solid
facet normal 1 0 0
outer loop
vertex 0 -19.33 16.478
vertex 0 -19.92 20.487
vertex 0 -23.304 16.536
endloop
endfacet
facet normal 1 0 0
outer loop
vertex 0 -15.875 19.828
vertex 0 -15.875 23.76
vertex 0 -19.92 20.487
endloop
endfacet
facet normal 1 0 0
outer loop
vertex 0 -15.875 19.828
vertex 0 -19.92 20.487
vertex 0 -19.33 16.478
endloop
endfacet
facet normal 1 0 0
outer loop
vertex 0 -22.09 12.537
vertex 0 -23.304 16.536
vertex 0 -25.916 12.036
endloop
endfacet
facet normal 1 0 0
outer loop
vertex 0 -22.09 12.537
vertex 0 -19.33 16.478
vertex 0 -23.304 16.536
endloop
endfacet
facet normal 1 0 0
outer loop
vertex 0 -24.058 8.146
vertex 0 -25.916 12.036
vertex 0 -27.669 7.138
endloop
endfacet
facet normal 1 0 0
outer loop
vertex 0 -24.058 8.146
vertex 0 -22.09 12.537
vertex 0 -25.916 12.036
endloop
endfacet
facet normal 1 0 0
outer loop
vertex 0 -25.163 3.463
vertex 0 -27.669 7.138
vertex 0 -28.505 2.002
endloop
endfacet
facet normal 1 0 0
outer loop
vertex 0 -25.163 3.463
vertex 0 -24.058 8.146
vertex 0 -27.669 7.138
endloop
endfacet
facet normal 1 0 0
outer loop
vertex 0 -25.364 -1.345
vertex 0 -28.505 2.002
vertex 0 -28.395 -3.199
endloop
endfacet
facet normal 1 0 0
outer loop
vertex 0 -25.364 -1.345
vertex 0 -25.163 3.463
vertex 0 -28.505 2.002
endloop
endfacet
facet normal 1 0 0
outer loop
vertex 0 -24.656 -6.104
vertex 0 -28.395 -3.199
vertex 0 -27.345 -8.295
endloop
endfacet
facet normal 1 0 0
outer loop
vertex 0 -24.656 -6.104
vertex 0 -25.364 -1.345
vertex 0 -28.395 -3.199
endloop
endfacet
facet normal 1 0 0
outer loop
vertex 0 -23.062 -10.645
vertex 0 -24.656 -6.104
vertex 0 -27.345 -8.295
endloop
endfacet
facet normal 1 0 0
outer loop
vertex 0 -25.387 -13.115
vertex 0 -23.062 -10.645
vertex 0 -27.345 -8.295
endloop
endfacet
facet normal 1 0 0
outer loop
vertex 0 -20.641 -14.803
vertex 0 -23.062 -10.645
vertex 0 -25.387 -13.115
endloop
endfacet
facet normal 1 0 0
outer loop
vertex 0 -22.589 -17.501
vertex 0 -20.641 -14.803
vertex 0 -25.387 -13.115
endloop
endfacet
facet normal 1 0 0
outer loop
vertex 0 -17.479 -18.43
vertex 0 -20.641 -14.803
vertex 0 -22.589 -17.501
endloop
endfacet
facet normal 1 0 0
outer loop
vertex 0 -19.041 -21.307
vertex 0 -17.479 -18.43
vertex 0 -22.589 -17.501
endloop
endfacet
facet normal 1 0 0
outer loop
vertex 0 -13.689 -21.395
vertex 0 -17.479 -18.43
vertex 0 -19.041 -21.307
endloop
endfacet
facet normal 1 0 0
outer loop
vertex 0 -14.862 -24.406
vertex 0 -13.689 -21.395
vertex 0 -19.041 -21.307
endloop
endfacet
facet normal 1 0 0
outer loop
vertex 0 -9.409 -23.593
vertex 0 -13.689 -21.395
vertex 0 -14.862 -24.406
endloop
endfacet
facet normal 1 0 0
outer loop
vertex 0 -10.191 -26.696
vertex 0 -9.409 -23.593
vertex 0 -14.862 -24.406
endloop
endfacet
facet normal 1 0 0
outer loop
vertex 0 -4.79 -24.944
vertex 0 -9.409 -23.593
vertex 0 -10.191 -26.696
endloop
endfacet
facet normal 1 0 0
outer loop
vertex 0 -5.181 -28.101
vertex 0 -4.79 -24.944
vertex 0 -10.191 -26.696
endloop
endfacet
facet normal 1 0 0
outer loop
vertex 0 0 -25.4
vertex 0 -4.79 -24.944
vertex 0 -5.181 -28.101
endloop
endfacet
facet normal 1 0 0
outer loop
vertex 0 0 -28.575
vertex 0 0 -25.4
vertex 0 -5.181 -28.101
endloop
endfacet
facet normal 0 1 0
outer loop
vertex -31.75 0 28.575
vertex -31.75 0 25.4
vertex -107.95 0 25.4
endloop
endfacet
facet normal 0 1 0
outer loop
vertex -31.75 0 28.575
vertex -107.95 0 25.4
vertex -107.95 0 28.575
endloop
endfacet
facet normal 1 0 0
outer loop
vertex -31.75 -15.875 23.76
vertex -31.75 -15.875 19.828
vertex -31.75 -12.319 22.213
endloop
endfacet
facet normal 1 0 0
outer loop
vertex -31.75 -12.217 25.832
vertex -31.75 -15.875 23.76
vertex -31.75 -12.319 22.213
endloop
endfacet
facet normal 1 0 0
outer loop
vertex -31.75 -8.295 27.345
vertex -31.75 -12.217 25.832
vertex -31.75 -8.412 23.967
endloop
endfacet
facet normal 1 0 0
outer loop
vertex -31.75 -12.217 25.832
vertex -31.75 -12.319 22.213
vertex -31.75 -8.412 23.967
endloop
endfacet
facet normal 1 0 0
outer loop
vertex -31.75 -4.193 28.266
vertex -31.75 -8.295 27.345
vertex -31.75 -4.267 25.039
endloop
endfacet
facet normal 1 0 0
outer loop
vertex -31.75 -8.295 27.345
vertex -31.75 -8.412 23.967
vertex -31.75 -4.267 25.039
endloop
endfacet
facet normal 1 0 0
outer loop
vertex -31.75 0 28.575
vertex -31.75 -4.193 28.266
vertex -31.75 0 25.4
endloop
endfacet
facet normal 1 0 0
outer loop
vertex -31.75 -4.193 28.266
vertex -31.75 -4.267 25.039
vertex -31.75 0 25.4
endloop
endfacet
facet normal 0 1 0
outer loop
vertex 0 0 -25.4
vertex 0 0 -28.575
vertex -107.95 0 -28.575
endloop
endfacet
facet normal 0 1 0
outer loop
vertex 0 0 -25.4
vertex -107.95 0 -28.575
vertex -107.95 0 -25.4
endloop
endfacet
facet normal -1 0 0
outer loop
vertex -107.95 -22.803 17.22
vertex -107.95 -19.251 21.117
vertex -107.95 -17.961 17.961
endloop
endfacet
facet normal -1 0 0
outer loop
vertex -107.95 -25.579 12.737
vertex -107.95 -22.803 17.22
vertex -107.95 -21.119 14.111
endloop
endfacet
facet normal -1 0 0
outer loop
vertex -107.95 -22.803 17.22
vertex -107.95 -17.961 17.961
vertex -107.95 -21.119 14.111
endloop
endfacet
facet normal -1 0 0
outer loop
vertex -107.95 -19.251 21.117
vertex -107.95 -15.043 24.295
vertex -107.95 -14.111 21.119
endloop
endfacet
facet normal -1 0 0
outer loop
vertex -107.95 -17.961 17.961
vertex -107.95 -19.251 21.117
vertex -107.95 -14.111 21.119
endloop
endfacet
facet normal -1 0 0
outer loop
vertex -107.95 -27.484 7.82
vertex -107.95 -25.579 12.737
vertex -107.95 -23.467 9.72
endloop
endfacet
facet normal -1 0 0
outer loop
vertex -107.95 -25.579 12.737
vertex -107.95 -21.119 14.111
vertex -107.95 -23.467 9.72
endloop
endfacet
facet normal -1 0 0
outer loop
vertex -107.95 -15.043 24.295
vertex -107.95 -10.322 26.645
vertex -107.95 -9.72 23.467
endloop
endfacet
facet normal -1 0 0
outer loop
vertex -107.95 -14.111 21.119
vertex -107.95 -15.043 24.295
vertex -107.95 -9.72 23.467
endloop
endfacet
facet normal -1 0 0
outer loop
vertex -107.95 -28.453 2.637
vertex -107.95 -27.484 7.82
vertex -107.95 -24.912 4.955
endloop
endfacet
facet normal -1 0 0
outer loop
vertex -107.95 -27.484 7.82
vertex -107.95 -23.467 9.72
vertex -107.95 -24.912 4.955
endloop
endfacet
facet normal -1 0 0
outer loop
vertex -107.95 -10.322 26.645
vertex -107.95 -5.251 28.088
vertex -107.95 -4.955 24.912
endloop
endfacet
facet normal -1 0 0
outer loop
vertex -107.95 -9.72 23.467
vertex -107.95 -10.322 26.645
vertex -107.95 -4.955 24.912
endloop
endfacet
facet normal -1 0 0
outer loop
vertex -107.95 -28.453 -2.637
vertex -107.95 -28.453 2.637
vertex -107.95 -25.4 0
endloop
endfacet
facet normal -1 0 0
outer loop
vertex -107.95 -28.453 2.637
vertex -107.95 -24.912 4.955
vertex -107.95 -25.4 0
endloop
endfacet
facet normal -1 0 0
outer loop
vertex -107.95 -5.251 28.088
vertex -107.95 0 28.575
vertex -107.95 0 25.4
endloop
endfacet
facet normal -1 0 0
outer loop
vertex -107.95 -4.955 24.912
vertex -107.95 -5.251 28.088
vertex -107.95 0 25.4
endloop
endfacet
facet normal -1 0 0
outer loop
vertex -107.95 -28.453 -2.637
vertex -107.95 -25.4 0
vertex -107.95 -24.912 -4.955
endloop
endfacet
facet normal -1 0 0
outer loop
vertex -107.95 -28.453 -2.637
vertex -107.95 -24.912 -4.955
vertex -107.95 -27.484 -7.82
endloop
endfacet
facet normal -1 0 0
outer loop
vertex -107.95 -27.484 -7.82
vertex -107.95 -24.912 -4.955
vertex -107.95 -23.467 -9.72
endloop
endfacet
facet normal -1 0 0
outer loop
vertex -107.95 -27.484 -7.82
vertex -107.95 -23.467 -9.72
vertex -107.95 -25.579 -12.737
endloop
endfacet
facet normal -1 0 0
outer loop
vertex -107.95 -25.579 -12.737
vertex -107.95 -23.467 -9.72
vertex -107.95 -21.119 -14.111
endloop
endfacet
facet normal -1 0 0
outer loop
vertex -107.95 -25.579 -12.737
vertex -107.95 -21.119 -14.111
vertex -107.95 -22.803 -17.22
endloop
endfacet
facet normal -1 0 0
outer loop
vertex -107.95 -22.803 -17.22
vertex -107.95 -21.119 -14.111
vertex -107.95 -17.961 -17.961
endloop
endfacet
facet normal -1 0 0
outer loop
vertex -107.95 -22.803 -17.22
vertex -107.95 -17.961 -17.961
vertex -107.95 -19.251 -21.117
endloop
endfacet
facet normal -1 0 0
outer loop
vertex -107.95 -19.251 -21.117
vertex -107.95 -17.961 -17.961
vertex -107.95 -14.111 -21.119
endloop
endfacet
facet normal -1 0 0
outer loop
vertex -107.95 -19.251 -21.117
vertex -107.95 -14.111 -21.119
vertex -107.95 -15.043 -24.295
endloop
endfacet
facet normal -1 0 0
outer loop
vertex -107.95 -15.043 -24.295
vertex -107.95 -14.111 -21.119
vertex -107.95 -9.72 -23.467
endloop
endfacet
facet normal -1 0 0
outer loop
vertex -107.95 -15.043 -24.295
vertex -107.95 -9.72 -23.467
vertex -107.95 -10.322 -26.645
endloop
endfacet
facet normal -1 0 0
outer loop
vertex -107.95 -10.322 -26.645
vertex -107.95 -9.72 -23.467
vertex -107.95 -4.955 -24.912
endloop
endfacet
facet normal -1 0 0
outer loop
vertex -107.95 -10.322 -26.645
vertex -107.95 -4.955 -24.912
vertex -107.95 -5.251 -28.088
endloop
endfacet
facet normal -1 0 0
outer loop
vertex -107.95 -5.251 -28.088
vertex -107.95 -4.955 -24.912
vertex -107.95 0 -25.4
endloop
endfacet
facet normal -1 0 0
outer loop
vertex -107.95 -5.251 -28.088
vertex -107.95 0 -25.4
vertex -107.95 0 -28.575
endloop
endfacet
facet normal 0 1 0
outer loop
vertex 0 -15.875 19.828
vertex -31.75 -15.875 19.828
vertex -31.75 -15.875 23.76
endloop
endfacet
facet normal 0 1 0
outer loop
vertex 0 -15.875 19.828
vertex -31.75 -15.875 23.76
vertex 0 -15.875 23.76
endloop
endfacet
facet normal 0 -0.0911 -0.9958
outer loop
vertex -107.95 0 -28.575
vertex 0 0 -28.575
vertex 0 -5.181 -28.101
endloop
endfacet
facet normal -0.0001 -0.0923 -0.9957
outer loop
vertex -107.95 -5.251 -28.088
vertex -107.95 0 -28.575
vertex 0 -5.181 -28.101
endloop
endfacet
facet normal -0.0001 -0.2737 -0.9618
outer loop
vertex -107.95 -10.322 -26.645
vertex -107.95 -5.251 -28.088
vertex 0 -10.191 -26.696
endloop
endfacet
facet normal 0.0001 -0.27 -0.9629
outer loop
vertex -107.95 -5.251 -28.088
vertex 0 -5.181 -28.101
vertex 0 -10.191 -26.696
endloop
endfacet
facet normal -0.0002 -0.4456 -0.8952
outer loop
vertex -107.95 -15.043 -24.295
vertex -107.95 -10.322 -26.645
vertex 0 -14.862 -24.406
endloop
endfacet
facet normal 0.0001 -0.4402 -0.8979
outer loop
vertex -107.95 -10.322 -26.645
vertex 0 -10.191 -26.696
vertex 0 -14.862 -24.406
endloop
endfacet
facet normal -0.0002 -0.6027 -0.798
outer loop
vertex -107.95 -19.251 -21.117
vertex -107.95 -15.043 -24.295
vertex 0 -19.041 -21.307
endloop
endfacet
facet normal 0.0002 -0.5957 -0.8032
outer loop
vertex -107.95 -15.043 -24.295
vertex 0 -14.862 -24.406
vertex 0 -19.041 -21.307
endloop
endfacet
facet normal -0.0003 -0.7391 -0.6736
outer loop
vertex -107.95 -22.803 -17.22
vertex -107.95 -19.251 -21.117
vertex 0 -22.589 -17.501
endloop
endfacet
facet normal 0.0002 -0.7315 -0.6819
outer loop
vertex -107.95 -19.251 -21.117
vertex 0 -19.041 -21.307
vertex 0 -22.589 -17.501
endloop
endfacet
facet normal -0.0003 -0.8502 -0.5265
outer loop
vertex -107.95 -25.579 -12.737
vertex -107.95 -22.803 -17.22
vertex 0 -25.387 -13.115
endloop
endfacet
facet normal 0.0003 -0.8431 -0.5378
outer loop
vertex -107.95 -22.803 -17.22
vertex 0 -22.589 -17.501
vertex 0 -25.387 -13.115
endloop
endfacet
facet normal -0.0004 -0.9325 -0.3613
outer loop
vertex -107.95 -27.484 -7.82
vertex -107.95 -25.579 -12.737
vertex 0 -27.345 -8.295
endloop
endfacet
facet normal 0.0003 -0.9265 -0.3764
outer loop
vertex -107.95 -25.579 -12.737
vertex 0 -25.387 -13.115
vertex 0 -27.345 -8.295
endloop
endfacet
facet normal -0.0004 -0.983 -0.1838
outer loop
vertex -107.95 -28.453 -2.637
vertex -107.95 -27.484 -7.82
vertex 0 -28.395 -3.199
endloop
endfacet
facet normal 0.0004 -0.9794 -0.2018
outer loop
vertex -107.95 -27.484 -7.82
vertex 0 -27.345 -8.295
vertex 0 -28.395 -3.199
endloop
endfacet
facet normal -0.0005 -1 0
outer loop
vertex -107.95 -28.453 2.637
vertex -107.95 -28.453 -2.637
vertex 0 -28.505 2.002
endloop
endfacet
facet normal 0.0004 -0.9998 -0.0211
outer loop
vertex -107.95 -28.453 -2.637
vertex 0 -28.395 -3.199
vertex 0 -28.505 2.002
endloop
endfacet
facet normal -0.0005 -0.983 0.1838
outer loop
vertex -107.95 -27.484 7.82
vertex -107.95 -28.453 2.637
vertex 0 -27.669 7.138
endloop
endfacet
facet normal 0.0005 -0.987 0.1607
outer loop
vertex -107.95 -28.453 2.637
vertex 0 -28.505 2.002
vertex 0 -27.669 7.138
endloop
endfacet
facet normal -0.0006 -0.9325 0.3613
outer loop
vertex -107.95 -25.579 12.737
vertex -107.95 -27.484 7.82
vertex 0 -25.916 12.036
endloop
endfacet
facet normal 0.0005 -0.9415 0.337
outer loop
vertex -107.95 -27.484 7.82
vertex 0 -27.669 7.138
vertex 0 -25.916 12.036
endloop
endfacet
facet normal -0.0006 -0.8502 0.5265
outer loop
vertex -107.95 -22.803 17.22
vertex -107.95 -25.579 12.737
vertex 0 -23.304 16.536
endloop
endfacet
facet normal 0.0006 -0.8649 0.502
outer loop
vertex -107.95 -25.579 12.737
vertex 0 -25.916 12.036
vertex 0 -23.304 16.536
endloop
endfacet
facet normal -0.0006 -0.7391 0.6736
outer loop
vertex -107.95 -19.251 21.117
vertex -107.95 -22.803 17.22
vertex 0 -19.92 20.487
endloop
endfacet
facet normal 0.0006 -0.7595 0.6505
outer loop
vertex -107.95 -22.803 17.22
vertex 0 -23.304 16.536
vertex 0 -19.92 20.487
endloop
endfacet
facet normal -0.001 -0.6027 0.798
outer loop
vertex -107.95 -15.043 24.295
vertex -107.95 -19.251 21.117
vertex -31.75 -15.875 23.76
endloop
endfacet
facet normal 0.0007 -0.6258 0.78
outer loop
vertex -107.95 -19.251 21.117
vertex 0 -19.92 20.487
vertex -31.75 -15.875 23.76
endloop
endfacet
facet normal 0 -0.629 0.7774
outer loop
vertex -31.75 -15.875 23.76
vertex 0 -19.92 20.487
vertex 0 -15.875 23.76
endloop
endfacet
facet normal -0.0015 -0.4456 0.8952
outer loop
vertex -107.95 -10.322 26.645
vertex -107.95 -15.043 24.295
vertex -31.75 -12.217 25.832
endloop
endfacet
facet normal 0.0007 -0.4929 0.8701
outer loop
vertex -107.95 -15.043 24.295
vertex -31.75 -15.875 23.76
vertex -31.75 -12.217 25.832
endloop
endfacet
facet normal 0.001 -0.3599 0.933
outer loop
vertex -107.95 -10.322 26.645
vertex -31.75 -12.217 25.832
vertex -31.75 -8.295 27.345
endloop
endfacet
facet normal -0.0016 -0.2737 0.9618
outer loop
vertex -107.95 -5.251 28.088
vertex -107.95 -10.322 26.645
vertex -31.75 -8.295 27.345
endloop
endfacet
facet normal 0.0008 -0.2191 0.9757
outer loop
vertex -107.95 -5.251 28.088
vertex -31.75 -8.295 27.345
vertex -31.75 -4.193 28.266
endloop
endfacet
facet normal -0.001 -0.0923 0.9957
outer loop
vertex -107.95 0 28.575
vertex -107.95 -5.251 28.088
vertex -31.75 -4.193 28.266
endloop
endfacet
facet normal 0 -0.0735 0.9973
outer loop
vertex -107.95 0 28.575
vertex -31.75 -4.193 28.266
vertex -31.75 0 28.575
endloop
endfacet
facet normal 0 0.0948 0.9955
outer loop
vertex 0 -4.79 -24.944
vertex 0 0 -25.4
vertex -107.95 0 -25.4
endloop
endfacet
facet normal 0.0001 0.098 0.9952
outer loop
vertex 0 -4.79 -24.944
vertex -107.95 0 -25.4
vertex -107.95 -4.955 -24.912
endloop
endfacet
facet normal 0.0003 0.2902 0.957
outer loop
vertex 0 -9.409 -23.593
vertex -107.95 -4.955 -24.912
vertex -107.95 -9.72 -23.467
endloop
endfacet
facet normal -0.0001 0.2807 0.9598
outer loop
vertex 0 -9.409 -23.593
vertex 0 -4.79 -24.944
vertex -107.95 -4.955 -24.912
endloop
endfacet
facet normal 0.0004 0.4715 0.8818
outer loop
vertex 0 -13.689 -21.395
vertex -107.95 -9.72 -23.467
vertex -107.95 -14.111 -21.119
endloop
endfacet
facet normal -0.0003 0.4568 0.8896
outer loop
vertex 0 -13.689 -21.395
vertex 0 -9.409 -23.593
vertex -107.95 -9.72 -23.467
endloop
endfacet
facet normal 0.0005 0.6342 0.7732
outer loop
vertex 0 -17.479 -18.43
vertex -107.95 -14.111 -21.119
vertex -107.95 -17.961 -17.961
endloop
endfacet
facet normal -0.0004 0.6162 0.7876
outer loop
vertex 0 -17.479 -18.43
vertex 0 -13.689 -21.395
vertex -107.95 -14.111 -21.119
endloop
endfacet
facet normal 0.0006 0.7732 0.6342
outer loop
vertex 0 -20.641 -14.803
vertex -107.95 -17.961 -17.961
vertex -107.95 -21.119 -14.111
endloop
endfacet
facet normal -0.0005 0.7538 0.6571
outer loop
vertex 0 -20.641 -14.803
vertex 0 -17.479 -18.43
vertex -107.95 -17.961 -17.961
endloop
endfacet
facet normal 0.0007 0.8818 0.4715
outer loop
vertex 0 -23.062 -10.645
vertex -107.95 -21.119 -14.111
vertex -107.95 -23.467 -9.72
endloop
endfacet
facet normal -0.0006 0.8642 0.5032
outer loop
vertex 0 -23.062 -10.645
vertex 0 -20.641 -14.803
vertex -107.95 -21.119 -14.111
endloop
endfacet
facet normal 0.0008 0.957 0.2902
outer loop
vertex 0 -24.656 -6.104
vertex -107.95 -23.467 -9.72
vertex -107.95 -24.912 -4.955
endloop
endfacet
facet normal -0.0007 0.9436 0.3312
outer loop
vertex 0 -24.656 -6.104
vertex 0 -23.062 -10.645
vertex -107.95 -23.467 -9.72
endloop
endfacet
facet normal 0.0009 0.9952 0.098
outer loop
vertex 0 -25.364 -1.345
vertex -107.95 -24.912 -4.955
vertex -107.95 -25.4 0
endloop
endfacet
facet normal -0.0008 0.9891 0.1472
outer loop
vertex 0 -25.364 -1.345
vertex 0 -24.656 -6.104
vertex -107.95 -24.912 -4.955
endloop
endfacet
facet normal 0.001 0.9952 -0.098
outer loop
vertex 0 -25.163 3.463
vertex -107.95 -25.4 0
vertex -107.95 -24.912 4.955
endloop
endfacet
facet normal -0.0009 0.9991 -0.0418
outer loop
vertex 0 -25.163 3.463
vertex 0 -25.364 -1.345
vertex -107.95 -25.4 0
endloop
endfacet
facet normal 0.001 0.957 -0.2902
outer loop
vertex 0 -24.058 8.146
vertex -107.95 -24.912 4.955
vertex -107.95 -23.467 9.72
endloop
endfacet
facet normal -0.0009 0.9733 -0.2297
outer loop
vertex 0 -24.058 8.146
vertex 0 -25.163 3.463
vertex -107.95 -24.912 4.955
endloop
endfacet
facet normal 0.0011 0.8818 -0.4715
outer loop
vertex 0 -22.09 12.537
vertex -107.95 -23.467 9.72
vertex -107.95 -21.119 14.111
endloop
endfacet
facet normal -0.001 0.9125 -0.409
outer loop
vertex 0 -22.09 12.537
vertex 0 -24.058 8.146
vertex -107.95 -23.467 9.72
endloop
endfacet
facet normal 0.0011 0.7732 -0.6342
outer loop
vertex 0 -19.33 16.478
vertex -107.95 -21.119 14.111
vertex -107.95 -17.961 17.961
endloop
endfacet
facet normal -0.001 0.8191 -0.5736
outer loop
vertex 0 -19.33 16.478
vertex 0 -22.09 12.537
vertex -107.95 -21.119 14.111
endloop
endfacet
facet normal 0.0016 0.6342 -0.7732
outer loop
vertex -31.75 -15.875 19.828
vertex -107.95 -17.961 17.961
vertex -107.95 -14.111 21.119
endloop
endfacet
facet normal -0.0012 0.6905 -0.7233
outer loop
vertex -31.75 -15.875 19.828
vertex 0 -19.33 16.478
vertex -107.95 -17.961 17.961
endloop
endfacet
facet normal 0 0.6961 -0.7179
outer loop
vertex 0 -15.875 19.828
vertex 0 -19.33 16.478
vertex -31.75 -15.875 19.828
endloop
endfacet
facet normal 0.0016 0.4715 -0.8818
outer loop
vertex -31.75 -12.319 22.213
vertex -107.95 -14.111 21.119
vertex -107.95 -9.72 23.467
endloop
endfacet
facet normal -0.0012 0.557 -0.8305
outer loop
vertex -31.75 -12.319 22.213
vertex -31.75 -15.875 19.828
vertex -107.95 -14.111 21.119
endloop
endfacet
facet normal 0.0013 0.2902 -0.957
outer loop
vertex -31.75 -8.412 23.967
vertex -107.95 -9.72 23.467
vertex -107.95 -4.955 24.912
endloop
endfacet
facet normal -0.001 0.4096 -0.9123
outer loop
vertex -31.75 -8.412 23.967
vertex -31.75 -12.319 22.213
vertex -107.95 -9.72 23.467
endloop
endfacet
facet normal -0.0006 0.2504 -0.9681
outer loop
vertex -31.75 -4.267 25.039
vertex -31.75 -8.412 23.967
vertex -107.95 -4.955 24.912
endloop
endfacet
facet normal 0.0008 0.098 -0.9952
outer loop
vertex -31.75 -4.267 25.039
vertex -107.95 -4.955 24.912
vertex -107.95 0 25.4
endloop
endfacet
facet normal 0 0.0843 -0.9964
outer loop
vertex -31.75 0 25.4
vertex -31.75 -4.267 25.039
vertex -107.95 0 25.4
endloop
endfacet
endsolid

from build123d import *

# Parameters (mm, degrees)
BOSS_EXTRUDE1_DEPTH = 107.95
SKETCH2_W           = 31.75
SKETCH2_H           = 15.875
CUT_EXTRUDE1_DEPTH  = 127
SKETCH3_OUTSIDE_W   = 91.34
SKETCH3_OUTSIDE_H   = 59.59
SKETCH3_OUTSIDE_R   = 28.575
CUT_EXTRUDE2_DEPTH  = 108.95


with BuildPart() as part:
    # Sketch1 → Boss-Extrude1 (new body)
    with BuildSketch(Plane(origin=(0, 0, 0), x_dir=(0, 0, -1), z_dir=(1, 0, 0))):
        with BuildLine():
            Line((-25.4, 0), (-31.75, 0))
            ThreePointArc((-31.75, 0), (0, -31.75), (31.75, 0))
            Line((31.75, 0), (25.4, 0))
            ThreePointArc((25.4, 0), (0, -25.4), (-25.4, 0))
        make_face()
    extrude(amount=-BOSS_EXTRUDE1_DEPTH)

    # Sketch2 → Cut-Extrude1 (cut)
    with BuildSketch(Plane.XY):
        with Locations((-15.875, -7.9375)):
            Rectangle(SKETCH2_W, SKETCH2_H)
    extrude(amount=CUT_EXTRUDE1_DEPTH, mode=Mode.SUBTRACT)

    # Sketch3 outside → Cut-Extrude2 (cut, through all)
    with BuildSketch(Plane(origin=(0, 0, 0), x_dir=(0, 0, -1), z_dir=(1, 0, 0))):
        with Locations((0, -15.875)):
            Rectangle(SKETCH3_OUTSIDE_W, SKETCH3_OUTSIDE_H)
        Circle(SKETCH3_OUTSIDE_R, mode=Mode.SUBTRACT)
    extrude(amount=-CUT_EXTRUDE2_DEPTH, mode=Mode.SUBTRACT)


solid = part.part
